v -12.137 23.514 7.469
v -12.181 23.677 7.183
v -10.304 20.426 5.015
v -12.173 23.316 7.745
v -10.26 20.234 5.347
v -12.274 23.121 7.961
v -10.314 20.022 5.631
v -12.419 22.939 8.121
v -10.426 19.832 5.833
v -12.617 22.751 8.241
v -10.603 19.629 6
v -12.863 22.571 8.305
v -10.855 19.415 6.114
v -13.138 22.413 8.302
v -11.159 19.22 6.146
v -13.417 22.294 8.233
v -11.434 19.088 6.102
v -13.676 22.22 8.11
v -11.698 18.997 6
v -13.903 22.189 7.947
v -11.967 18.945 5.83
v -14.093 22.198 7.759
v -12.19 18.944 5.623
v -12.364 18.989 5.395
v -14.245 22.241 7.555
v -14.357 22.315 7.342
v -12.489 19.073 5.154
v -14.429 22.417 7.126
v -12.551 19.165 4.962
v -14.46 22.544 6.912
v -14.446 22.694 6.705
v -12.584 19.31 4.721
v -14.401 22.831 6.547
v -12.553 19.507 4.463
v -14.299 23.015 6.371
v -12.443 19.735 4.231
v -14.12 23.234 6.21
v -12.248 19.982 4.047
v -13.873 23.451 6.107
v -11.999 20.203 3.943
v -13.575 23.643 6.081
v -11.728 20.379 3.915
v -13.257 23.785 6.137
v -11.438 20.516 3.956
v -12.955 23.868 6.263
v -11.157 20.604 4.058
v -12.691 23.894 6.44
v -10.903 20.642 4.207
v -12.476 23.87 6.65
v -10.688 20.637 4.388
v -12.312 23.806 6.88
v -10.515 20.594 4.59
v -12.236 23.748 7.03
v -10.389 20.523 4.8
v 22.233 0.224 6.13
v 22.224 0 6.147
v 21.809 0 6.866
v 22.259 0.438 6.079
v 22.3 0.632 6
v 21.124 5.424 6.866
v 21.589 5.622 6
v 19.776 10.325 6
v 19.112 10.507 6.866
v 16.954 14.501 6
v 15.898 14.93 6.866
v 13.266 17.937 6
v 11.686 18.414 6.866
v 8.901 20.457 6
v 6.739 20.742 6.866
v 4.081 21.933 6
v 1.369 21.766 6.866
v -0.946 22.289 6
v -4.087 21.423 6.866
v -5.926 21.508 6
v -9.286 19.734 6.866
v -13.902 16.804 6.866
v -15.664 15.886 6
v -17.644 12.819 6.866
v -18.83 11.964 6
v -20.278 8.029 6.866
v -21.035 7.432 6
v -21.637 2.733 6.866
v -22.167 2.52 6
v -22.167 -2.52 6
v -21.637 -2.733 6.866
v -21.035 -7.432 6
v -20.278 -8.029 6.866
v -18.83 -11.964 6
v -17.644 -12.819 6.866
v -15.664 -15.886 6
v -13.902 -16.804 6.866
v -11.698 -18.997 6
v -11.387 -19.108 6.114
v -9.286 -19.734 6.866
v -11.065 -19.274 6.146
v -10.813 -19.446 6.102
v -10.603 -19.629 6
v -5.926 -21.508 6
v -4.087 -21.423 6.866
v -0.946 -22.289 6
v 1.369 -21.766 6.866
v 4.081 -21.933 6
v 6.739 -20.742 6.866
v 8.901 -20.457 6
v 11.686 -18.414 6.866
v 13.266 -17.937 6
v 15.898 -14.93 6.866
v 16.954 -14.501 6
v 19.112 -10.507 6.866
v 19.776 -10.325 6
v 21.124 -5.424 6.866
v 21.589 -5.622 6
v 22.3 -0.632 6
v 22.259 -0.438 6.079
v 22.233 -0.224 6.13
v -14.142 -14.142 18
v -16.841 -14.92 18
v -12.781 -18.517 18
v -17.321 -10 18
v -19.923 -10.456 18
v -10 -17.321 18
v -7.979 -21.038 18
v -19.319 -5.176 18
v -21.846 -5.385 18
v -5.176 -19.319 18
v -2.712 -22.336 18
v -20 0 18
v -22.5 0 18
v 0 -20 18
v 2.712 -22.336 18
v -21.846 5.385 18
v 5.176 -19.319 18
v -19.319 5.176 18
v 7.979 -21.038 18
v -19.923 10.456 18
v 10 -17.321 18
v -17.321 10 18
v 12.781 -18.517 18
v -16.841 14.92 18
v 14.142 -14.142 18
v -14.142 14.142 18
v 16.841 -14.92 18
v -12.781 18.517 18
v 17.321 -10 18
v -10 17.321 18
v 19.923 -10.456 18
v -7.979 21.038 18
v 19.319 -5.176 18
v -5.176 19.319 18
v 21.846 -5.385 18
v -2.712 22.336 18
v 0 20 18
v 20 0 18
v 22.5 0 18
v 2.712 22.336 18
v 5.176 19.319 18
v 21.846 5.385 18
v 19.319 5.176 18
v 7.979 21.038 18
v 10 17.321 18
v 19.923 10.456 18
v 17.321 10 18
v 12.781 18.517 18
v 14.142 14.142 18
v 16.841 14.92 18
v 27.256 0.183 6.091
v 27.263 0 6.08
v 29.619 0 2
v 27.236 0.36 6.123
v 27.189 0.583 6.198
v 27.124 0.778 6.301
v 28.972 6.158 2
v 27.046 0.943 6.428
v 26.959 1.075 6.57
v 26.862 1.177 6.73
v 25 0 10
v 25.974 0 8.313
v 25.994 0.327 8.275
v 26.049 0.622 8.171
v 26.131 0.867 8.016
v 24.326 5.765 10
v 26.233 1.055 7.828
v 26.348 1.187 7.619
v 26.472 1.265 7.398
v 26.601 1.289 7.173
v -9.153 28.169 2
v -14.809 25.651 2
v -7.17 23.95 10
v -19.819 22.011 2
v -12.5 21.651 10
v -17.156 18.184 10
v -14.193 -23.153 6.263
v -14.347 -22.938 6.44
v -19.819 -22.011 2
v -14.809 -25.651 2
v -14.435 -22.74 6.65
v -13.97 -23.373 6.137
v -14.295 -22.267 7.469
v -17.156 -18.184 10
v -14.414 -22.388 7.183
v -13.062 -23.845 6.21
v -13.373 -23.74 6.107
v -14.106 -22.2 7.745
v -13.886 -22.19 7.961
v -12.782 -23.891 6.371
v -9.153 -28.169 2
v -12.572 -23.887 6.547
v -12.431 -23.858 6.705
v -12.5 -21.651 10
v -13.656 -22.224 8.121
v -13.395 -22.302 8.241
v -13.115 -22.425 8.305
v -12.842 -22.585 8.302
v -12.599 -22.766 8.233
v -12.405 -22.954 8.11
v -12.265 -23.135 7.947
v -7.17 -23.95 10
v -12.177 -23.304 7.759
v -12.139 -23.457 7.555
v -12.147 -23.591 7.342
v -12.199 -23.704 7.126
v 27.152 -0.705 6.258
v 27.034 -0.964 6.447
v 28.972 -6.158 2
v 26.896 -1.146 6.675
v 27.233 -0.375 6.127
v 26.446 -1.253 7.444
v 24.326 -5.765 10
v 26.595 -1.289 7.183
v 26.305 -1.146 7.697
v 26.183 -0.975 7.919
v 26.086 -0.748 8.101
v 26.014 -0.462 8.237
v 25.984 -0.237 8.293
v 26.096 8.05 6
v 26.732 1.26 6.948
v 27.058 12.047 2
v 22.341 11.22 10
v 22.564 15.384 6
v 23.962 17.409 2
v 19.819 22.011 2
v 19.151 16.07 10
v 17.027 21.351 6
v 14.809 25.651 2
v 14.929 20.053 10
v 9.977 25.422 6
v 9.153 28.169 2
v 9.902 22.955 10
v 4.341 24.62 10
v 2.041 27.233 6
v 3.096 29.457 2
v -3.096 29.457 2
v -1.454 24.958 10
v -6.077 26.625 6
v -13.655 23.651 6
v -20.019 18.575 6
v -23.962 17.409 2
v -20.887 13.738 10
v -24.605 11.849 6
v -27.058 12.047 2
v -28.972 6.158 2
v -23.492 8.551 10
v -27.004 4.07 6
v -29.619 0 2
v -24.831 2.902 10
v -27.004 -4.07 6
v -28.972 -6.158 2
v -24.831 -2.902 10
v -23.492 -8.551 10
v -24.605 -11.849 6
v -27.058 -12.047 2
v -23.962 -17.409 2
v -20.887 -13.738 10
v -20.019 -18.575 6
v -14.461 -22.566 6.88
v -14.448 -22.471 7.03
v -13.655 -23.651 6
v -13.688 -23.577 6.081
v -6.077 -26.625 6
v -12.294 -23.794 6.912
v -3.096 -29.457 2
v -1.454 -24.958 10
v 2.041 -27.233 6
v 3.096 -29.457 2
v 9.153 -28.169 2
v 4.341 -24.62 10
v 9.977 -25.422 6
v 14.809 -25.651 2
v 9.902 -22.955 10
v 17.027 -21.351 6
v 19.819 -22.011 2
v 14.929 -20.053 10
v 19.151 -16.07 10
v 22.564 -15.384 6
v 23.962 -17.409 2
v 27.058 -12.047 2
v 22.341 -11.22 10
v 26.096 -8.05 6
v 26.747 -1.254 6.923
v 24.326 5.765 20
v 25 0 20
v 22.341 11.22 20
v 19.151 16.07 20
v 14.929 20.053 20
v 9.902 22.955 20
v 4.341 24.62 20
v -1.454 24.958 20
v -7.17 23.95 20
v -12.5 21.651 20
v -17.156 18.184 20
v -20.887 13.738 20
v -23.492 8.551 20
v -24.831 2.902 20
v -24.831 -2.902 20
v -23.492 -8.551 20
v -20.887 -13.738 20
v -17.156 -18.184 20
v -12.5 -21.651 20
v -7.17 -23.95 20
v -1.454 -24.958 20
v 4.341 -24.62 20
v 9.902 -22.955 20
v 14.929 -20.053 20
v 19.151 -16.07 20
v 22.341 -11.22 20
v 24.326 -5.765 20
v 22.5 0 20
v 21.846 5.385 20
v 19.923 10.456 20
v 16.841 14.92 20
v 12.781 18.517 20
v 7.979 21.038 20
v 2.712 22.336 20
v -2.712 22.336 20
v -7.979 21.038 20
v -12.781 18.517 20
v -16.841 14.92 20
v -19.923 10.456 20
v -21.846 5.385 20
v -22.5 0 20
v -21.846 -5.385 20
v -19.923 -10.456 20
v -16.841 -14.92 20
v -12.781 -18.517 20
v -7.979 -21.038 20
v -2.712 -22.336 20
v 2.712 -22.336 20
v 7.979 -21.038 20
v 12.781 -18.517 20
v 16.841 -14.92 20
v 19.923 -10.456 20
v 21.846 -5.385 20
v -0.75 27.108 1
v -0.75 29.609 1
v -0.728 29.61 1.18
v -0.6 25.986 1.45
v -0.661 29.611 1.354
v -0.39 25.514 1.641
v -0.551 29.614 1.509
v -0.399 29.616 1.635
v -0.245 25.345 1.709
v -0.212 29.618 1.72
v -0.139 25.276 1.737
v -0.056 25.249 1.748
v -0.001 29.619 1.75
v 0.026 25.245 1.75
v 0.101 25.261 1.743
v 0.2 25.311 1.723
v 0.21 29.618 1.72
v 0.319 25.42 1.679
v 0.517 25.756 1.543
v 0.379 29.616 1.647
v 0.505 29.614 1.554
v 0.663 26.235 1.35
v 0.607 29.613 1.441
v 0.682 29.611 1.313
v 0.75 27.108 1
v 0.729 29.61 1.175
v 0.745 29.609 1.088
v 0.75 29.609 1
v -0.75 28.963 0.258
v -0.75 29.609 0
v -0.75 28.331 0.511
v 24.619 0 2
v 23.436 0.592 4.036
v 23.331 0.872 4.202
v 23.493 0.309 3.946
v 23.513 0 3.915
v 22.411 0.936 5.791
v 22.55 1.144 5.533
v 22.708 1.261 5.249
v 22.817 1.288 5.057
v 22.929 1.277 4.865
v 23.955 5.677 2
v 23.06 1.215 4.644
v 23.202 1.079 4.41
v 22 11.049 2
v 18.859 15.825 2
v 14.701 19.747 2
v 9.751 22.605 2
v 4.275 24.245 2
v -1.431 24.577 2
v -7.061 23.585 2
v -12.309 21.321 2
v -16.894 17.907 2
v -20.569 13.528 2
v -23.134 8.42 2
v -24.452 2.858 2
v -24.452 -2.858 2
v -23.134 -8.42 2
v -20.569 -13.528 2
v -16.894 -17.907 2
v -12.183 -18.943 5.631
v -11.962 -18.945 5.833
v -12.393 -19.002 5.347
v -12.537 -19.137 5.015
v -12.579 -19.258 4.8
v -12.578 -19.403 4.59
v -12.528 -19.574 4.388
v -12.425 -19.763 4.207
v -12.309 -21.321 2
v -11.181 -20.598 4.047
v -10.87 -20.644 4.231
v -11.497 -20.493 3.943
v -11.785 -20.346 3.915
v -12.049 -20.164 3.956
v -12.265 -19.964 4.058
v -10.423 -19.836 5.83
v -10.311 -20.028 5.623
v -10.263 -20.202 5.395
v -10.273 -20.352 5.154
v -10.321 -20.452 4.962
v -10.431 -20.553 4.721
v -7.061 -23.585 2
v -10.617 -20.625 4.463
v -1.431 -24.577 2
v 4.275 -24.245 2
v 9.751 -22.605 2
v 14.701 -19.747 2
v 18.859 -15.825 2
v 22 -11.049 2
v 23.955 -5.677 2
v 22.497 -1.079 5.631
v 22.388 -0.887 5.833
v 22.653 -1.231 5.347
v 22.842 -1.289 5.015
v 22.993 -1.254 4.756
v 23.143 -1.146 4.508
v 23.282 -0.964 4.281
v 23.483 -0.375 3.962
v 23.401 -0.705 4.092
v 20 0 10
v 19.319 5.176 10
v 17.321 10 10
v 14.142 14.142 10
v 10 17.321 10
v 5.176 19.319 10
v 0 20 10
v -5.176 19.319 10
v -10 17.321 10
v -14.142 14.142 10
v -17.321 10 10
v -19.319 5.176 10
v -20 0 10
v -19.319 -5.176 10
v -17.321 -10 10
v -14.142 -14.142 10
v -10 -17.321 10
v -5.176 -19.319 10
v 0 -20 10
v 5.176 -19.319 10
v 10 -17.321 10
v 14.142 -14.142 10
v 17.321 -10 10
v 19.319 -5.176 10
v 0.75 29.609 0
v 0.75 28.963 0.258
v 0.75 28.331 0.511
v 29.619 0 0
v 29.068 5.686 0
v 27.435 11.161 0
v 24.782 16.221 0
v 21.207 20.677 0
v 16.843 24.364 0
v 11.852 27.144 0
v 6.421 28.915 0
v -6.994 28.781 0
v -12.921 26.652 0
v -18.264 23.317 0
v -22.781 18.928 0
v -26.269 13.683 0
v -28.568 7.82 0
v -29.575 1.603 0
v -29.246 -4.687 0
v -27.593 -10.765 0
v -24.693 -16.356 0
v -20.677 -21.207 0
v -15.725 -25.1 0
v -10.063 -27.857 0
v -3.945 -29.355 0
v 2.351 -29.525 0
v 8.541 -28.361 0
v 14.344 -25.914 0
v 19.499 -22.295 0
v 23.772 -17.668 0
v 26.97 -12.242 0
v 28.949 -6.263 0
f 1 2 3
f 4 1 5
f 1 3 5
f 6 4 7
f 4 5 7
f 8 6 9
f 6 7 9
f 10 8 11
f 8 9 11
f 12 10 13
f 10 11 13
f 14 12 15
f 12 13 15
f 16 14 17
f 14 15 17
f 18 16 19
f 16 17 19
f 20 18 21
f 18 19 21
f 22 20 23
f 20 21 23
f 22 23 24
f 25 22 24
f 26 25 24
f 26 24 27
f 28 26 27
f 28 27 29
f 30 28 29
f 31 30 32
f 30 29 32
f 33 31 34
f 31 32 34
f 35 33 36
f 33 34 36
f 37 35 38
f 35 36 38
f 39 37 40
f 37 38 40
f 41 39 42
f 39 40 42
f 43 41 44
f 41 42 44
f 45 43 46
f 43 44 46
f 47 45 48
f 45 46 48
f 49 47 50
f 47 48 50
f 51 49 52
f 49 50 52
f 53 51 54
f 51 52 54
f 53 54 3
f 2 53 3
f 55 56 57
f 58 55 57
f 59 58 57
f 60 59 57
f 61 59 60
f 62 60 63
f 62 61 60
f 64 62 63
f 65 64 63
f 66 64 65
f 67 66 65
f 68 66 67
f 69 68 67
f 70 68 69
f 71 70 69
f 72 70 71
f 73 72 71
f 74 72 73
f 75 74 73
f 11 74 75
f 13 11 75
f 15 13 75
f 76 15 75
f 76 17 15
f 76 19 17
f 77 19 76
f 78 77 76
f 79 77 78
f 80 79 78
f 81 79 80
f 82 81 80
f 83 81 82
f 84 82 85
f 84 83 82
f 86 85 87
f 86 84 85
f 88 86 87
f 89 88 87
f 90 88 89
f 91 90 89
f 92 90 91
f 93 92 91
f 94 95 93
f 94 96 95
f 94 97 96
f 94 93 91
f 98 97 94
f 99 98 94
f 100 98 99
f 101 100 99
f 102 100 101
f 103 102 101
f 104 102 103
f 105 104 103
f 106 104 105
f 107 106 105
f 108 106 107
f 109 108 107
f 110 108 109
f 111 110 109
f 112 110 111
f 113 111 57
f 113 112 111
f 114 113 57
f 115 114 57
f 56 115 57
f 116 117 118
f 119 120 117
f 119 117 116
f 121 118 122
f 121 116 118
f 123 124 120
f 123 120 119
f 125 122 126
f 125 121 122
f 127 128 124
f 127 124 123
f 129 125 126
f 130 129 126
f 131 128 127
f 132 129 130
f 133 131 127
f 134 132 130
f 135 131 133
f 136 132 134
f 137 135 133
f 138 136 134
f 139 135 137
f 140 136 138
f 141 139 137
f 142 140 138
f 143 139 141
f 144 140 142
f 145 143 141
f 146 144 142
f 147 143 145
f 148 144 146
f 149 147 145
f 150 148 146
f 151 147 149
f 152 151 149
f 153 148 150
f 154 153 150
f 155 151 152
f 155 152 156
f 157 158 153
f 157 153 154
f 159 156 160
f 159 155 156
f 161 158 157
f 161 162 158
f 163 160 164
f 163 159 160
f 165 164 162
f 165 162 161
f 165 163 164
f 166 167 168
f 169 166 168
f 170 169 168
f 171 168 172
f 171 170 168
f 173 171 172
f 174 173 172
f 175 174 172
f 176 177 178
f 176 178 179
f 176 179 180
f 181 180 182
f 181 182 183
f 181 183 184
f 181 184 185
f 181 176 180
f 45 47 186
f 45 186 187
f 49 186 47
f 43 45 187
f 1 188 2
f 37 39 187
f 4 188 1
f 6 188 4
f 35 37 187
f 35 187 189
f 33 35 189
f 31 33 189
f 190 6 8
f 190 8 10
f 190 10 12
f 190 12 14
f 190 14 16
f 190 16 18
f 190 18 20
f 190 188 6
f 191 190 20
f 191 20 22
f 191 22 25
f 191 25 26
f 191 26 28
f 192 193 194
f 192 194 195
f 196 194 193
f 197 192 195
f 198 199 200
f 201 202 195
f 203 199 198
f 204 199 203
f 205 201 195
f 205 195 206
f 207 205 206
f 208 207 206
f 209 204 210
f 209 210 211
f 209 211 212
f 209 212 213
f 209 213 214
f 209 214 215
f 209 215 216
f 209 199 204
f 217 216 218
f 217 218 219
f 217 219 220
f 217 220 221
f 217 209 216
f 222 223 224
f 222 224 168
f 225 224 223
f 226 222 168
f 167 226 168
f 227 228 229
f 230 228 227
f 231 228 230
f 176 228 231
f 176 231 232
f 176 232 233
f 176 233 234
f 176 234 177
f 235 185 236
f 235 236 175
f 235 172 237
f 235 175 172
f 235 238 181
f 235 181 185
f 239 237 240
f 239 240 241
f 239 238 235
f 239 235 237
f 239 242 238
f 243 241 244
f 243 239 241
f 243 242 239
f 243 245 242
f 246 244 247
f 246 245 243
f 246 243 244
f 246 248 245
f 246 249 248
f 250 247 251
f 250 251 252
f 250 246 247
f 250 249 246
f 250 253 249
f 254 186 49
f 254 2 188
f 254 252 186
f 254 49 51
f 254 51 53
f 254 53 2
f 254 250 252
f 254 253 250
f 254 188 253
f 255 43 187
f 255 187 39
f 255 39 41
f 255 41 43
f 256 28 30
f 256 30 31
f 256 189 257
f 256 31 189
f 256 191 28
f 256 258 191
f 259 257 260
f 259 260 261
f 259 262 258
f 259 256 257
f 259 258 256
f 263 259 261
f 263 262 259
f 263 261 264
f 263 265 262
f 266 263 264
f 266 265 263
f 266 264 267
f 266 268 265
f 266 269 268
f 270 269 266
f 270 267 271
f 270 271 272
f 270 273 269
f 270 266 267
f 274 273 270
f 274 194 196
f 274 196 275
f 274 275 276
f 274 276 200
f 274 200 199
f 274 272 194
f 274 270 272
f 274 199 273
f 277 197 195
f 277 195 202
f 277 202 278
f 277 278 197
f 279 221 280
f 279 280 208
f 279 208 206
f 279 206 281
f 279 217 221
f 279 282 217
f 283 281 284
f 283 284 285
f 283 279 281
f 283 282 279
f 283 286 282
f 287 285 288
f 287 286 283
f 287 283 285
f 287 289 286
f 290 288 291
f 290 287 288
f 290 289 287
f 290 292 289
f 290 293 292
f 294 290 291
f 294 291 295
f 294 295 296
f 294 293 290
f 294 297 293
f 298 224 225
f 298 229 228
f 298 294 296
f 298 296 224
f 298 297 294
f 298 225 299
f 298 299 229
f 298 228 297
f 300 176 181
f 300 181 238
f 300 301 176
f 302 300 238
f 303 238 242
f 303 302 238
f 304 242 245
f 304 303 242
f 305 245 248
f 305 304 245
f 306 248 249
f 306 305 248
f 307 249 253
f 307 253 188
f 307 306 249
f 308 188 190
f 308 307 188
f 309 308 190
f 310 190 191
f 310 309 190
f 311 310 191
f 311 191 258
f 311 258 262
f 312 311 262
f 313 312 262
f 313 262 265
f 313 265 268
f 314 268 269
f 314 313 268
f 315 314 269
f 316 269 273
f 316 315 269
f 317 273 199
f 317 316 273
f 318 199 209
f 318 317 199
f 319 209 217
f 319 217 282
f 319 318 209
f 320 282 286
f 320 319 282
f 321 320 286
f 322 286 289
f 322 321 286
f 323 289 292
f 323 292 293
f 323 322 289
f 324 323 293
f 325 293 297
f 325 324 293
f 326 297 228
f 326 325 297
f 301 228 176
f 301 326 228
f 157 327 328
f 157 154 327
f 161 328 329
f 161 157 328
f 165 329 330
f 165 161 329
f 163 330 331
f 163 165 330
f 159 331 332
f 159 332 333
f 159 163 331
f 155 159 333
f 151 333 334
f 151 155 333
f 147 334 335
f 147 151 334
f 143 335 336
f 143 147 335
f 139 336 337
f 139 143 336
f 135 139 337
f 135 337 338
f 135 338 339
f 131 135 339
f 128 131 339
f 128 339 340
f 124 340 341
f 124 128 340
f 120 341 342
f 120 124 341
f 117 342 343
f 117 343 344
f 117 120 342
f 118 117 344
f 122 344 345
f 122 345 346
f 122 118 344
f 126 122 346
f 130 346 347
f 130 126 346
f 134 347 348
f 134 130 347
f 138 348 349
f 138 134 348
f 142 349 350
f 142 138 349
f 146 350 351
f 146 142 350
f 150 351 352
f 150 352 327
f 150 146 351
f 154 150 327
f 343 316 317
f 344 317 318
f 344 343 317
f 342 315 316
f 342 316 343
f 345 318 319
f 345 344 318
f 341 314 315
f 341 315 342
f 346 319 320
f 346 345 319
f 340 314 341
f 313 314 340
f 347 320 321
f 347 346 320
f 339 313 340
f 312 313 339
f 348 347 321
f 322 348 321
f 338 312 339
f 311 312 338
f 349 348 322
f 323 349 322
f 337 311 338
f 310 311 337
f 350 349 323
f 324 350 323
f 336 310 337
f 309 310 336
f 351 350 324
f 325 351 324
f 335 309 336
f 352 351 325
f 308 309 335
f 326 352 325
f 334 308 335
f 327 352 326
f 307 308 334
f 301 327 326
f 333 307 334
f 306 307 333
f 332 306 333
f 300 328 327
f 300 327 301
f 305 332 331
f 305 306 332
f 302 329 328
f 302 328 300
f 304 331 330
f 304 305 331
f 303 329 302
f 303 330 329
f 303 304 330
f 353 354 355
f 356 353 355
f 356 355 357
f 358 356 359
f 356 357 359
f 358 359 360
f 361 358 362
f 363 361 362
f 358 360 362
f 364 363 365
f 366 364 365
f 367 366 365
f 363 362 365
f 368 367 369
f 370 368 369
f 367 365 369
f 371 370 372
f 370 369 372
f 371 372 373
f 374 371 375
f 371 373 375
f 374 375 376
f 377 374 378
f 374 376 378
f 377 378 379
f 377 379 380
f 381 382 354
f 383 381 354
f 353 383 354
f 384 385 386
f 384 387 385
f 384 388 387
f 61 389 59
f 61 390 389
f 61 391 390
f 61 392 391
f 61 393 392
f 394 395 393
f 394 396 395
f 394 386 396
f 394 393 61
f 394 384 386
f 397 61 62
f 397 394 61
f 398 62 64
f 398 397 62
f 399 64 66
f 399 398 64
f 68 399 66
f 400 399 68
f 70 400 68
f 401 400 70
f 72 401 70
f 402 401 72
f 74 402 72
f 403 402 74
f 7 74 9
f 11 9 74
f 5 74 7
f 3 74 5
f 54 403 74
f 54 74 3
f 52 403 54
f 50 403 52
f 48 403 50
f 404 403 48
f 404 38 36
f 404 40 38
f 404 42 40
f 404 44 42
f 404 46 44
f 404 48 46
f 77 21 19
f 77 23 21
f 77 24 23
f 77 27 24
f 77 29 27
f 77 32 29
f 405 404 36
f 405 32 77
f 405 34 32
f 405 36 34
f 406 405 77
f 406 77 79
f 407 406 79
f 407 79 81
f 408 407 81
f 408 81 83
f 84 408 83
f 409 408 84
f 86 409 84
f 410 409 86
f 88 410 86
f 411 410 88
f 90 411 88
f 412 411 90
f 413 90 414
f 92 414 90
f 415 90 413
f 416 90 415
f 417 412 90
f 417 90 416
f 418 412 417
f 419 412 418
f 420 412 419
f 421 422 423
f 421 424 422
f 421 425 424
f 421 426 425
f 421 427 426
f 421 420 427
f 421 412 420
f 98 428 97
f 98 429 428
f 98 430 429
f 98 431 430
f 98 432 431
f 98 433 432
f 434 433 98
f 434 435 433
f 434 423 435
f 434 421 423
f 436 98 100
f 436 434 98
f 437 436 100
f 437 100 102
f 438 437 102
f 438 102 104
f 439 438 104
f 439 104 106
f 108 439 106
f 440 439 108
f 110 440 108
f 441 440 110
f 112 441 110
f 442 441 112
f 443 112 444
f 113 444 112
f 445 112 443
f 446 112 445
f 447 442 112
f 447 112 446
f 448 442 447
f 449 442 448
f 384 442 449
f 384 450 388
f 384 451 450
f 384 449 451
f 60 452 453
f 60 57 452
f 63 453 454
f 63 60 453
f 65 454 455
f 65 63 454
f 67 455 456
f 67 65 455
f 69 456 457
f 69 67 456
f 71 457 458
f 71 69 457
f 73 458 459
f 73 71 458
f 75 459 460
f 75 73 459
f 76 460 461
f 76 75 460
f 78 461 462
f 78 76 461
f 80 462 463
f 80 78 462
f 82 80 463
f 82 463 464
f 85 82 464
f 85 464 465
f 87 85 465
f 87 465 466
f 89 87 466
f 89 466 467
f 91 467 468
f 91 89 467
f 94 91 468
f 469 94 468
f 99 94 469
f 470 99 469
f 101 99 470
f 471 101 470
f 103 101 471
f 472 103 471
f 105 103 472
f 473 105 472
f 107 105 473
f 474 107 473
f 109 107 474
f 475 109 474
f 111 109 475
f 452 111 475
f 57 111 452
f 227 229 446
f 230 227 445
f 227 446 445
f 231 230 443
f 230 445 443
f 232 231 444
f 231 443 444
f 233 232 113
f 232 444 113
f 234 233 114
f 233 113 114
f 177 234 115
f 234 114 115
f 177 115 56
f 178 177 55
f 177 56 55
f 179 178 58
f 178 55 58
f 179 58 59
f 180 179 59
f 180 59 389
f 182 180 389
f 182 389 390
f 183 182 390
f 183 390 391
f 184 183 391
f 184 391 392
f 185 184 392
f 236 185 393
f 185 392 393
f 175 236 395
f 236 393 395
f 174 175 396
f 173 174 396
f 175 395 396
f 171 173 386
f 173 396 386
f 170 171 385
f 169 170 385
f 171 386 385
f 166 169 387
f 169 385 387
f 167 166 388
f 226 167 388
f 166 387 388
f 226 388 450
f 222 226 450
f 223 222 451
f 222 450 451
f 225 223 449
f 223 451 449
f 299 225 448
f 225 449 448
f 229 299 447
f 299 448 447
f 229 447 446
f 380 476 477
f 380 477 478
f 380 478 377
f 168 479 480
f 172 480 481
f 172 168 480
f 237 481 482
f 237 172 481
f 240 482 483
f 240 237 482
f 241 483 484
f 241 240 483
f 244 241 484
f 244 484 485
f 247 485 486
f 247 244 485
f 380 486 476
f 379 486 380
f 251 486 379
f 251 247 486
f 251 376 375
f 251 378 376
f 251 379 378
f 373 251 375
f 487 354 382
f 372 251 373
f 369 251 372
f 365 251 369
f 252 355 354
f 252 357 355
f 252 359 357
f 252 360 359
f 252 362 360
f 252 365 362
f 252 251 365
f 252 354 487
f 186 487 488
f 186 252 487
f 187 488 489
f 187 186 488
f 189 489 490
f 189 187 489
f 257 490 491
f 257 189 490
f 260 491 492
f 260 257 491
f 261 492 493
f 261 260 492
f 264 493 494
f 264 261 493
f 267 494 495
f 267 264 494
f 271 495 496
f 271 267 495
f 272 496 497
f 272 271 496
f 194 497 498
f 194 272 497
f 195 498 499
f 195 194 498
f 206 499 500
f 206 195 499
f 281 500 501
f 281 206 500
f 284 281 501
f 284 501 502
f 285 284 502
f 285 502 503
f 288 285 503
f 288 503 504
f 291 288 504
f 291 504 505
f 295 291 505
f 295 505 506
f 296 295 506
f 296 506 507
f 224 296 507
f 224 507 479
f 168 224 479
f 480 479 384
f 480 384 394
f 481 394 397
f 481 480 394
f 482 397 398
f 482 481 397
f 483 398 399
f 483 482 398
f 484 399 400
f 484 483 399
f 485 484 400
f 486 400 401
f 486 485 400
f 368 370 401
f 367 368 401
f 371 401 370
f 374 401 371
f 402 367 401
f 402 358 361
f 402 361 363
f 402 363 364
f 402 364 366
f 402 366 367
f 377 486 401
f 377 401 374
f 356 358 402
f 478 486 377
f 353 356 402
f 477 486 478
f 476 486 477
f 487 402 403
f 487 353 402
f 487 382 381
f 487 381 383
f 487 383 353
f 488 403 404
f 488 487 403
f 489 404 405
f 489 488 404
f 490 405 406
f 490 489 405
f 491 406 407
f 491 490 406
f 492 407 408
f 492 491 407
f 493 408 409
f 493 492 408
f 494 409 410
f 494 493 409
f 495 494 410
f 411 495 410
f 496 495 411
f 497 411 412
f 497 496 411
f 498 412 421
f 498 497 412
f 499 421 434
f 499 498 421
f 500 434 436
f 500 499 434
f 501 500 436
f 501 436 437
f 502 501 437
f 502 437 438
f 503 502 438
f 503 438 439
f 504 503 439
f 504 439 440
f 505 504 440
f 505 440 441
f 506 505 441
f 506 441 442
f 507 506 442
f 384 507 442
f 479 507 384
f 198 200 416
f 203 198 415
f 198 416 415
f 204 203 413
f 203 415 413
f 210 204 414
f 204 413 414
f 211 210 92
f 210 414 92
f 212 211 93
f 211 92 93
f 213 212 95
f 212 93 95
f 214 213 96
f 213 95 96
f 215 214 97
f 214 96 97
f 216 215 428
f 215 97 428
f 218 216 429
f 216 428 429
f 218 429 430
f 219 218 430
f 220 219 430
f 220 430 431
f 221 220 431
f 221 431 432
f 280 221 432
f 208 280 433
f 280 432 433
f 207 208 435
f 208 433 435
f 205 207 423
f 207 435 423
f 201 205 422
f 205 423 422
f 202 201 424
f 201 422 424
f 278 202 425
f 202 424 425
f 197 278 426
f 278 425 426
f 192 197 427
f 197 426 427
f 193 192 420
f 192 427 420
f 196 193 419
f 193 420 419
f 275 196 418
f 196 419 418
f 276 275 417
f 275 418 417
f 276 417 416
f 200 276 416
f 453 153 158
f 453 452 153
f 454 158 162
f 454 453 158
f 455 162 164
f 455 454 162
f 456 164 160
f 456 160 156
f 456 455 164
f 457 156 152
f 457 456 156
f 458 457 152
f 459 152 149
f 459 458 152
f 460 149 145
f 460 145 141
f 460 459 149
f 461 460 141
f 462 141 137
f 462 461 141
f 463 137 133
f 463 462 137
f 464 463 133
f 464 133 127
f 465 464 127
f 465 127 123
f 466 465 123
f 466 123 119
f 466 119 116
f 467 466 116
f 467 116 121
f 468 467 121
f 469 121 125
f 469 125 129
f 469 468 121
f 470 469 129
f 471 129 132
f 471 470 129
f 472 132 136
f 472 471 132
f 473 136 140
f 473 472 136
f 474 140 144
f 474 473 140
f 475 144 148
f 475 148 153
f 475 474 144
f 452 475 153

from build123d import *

# Parameters (mm, degrees)
F4_D            = 2.5781
F4_COPIES_COUNT = 3
F7_W            = 1.5
F7_H            = 2
F8_DEPTH        = 25


# Not quite as in the source:
# - a pattern or mirror of a feature is missing from the dataset's text; its kind, count and spacing are read off the source's solid


with BuildPart() as f1:
    # F0 (on Front) → F1 (revolve)
    with BuildSketch(Plane.XZ):
        Polygon((22.5, 18), (20, 18), (20, 10), (21.8094010768, 6.8660254038), (22.3094010768, 6), (24.6188021535, 2), (29.6188021535, 0), (29.6188021535, 2), (25, 10), (25, 18), (25, 20), (22.5, 20), align=None)
    revolve(axis=Axis((0, 0, 41.8434557322), (0, 0, 1)))

    # F4 (through all)
    with Locations(Plane(origin=(23.0801270189, 0, 13.3253175473), x_dir=(0, 1, 0), z_dir=(0.8660254038, 0, 0.5))):
        with Locations((0, -7.0773502692)):
            f4 = Hole(F4_D / 2)

    # F4_copies: F4 ×3 about axis
    f4_copies_axis = Axis((0, 0, 0), (0, 0, 1))
    for i in range(1, F4_COPIES_COUNT):
        add(f4.rotate(f4_copies_axis, i * 360 / F4_COPIES_COUNT), mode=Mode.SUBTRACT)

    # F7 (on line) → F8 (cut)
    with BuildSketch(Plane(origin=(0, 29.619, 0), x_dir=(-1, 0, 0), z_dir=(0, 1, 0))):
        Rectangle(F7_W, F7_H)
        with BuildLine():
            Line((-0.75, 1), (0.75, 1))
            ThreePointArc((0.75, 1), (0, 1.75), (-0.75, 1))
        make_face()
    extrude(amount=-F8_DEPTH, mode=Mode.SUBTRACT)


solid = f1.part
